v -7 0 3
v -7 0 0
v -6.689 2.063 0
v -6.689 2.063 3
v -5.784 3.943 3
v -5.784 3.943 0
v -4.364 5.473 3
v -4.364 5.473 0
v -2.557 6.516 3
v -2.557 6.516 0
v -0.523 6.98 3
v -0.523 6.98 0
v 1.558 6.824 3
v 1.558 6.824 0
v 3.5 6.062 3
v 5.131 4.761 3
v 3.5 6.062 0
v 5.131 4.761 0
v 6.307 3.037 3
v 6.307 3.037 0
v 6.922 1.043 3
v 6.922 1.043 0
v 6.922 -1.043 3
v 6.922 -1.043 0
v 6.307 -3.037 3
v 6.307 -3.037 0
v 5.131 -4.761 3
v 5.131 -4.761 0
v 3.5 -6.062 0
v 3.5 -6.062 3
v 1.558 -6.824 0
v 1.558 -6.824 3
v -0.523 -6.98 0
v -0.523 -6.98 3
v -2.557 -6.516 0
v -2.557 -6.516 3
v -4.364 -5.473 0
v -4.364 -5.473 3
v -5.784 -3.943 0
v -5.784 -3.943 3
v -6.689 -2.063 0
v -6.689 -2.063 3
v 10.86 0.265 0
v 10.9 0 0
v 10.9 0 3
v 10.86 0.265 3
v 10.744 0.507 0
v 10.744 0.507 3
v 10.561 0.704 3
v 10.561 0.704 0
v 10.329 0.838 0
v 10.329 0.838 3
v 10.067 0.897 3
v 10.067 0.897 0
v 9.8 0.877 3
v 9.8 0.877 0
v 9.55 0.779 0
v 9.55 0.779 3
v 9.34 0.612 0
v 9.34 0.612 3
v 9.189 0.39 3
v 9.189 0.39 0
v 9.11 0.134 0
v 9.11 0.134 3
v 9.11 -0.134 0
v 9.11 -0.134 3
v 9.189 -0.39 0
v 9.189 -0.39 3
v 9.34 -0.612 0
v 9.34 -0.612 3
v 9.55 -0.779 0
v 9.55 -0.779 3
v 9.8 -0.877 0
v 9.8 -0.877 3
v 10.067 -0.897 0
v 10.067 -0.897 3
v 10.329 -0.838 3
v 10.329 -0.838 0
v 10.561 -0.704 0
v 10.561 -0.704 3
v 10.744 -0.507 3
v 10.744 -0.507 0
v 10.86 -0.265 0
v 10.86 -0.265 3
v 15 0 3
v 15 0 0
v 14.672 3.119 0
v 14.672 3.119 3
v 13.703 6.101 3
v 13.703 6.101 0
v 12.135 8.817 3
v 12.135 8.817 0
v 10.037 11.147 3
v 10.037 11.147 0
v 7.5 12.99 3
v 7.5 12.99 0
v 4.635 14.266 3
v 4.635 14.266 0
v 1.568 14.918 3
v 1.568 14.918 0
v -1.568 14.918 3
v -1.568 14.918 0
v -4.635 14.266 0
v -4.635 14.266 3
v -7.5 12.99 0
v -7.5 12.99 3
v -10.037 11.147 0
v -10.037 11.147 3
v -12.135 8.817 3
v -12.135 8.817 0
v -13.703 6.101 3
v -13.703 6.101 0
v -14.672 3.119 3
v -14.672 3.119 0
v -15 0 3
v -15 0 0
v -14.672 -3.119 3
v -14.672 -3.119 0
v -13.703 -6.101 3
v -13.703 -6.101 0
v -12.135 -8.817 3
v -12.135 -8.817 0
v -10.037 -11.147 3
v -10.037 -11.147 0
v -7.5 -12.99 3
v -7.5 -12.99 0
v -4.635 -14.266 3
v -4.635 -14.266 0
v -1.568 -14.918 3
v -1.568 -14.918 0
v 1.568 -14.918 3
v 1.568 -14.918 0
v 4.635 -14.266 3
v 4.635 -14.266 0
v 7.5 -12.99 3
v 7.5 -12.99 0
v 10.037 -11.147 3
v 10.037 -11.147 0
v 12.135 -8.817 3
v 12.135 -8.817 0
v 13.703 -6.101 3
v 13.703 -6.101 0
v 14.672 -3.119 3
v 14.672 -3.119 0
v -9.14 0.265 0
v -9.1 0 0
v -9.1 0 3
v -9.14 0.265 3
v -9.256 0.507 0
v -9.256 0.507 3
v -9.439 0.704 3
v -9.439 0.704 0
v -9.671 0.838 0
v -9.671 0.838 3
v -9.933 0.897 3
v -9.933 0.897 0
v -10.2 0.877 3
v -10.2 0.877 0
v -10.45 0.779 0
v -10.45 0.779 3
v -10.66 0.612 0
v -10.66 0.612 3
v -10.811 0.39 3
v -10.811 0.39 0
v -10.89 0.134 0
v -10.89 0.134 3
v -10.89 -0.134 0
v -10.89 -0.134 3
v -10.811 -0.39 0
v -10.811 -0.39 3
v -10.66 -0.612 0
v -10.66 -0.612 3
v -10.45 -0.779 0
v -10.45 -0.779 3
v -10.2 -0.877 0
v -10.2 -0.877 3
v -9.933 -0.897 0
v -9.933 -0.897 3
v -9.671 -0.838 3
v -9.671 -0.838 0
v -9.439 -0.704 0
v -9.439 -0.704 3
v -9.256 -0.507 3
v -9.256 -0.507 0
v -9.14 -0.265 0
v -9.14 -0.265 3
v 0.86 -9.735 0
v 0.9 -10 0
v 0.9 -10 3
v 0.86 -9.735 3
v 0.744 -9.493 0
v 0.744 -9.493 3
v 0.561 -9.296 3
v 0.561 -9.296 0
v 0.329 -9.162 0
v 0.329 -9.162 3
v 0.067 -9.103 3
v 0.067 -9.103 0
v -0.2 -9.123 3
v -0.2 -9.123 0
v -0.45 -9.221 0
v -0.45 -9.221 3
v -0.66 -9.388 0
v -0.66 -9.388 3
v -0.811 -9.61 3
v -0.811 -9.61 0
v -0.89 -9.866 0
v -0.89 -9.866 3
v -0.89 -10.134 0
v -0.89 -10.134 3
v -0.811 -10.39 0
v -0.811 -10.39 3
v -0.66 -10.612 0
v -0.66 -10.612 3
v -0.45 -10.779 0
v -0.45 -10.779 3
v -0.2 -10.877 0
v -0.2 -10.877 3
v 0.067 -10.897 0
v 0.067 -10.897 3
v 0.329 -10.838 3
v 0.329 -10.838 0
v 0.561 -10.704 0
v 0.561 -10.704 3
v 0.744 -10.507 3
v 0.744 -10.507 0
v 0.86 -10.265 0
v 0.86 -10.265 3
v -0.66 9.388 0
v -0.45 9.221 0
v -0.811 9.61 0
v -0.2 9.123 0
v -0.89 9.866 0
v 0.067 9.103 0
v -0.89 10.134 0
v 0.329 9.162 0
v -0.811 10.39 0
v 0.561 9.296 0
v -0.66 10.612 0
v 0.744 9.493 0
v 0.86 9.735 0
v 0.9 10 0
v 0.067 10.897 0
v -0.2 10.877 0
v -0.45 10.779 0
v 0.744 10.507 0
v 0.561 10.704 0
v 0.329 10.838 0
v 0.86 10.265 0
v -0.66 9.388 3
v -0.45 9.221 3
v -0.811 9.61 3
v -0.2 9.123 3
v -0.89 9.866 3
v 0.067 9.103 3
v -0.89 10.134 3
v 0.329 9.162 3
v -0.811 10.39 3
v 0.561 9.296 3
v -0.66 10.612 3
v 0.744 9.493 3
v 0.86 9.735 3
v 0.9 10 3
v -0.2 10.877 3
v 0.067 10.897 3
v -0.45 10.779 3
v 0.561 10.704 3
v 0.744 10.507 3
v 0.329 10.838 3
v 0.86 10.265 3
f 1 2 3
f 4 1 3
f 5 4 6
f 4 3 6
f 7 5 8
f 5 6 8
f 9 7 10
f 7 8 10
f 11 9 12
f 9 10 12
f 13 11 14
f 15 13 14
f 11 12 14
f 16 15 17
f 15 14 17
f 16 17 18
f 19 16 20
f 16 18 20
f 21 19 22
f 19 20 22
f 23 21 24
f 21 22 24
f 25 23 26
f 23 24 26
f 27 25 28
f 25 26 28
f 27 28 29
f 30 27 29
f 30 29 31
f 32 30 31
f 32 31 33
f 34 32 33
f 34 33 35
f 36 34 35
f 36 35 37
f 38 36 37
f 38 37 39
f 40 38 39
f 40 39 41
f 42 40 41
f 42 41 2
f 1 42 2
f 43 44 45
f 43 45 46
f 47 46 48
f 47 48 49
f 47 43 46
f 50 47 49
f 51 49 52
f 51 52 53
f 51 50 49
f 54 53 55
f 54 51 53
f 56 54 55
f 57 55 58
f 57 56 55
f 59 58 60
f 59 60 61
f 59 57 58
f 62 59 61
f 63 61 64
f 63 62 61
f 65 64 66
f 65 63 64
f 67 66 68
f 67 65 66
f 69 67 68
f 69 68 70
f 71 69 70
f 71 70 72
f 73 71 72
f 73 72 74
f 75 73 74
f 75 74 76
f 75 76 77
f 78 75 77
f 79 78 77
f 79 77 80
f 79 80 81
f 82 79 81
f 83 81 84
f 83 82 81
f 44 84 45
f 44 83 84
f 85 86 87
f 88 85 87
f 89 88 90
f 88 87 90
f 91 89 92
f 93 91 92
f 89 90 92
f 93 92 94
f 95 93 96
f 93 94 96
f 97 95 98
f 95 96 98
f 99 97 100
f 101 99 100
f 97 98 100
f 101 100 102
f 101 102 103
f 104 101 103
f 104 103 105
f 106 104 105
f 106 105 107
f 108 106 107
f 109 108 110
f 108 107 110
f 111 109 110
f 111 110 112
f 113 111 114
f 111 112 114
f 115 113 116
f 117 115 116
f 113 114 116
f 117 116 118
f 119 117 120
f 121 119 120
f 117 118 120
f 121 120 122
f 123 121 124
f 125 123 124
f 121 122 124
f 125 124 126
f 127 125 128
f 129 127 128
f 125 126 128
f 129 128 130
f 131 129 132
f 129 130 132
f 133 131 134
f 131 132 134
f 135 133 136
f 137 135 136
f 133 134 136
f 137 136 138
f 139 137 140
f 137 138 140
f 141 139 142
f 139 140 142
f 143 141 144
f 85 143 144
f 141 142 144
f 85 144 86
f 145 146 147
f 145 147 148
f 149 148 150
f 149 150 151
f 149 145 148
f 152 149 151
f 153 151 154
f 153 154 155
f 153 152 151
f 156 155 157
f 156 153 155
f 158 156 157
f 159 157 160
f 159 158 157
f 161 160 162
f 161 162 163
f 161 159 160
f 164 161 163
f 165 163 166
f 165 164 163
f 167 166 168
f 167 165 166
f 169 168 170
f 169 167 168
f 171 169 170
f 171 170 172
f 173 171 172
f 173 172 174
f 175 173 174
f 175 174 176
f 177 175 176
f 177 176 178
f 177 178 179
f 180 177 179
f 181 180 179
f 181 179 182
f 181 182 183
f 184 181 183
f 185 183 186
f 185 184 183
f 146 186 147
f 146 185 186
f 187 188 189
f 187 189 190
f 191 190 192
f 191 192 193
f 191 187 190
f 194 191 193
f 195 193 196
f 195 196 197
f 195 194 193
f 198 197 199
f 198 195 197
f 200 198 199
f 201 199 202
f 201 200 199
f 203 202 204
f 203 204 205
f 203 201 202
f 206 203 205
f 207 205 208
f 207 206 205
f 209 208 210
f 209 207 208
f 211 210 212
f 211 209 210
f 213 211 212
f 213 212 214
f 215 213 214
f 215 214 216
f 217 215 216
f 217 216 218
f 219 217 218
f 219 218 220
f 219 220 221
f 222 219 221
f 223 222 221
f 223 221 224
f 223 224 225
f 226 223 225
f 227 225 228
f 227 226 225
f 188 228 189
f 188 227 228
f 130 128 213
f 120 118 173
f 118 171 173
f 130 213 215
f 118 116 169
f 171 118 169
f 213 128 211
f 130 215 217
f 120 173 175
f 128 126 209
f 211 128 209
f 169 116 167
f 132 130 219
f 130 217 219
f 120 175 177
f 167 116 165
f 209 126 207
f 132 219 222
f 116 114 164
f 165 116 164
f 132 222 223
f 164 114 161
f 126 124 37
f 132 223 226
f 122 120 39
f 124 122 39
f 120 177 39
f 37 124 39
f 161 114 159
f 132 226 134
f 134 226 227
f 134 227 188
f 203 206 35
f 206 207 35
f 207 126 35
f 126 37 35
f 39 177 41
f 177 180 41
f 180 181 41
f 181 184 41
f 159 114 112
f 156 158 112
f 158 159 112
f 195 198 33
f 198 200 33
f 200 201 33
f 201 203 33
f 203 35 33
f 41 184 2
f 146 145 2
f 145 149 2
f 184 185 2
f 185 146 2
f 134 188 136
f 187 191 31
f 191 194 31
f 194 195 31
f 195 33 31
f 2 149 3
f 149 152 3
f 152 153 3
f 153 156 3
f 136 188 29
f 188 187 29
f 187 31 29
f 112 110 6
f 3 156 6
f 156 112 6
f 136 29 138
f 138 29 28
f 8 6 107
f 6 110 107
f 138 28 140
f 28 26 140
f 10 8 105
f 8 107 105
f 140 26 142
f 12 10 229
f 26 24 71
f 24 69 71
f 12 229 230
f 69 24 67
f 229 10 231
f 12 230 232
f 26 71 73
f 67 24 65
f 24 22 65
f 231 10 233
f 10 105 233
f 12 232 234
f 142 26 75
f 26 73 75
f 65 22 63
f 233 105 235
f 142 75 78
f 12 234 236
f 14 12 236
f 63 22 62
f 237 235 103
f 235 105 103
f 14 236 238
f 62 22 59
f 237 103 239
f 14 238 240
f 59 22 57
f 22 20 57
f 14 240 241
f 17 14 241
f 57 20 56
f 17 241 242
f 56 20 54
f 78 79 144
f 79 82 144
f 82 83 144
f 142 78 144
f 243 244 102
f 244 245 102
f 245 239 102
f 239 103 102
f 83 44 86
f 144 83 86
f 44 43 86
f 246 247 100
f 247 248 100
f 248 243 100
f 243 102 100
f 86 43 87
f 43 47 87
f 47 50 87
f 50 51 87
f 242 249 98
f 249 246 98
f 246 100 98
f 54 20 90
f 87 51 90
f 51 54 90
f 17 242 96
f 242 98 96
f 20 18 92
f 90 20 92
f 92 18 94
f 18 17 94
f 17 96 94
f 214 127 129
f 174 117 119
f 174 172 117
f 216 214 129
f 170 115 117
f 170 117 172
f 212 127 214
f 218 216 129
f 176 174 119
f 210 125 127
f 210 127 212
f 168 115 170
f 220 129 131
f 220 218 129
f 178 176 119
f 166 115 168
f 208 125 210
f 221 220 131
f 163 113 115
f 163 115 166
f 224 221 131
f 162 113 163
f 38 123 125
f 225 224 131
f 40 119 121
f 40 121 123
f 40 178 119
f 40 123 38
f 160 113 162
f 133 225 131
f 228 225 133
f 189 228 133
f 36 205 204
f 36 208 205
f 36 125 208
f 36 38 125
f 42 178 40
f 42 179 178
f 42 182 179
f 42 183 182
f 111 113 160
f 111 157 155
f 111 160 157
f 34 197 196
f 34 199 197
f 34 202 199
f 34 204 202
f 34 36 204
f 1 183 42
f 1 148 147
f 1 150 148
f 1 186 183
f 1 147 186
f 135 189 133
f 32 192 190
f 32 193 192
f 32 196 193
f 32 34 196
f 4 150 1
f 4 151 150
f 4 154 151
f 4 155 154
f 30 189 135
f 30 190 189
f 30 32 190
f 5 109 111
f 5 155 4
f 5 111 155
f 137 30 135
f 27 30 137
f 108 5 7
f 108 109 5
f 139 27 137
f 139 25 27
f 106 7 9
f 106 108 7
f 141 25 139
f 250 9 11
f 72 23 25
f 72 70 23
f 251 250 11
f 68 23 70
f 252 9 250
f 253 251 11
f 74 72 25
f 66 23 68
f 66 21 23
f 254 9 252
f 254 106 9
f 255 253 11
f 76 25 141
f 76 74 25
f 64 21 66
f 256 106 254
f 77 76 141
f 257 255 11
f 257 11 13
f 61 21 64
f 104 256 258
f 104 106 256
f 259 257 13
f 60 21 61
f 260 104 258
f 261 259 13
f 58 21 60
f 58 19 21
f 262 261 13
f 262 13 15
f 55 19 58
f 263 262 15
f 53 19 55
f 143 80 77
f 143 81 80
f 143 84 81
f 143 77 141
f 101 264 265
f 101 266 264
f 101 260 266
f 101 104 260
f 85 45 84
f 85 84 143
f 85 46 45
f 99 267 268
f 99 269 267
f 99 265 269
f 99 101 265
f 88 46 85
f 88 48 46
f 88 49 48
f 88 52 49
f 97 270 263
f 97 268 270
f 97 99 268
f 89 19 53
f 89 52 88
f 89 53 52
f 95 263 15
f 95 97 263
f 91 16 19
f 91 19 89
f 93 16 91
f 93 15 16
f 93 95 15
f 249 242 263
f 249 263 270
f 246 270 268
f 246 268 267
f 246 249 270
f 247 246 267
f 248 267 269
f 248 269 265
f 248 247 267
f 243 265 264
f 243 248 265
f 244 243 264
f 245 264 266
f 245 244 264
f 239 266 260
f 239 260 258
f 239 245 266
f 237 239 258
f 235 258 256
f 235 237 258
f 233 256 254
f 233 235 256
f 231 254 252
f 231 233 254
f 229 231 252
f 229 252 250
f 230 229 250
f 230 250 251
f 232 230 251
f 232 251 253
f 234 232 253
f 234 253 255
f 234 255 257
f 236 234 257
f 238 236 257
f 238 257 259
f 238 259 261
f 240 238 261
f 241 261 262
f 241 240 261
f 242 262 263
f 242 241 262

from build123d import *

# Parameters (mm, degrees)
SKETCH1_R           = 15
SKETCH1_R_2         = 0.9
BOSS_EXTRUDE1_DEPTH = 3
SKETCH2_R           = 7
CUT_EXTRUDE1_DEPTH  = 5.5


with BuildPart() as part:
    # Sketch1 → Boss-Extrude1 (new body)
    with BuildSketch(Plane.XY):
        Circle(SKETCH1_R)
        with Locations((0, -10)):
            Circle(SKETCH1_R_2, mode=Mode.SUBTRACT)
        with Locations((-10, 0)):
            Circle(SKETCH1_R_2, mode=Mode.SUBTRACT)
        with Locations((0, 10)):
            Circle(SKETCH1_R_2, mode=Mode.SUBTRACT)
        with Locations((10, 0)):
            Circle(SKETCH1_R_2, mode=Mode.SUBTRACT)
    extrude(amount=BOSS_EXTRUDE1_DEPTH)

    # Sketch2 → Cut-Extrude1 (cut)
    with BuildSketch(Plane(origin=(0, 0, 0), x_dir=(-1, 0, 0), z_dir=(0, 0, -1))):
        Circle(SKETCH2_R)
    extrude(amount=-CUT_EXTRUDE1_DEPTH, mode=Mode.SUBTRACT)


solid = part.part
